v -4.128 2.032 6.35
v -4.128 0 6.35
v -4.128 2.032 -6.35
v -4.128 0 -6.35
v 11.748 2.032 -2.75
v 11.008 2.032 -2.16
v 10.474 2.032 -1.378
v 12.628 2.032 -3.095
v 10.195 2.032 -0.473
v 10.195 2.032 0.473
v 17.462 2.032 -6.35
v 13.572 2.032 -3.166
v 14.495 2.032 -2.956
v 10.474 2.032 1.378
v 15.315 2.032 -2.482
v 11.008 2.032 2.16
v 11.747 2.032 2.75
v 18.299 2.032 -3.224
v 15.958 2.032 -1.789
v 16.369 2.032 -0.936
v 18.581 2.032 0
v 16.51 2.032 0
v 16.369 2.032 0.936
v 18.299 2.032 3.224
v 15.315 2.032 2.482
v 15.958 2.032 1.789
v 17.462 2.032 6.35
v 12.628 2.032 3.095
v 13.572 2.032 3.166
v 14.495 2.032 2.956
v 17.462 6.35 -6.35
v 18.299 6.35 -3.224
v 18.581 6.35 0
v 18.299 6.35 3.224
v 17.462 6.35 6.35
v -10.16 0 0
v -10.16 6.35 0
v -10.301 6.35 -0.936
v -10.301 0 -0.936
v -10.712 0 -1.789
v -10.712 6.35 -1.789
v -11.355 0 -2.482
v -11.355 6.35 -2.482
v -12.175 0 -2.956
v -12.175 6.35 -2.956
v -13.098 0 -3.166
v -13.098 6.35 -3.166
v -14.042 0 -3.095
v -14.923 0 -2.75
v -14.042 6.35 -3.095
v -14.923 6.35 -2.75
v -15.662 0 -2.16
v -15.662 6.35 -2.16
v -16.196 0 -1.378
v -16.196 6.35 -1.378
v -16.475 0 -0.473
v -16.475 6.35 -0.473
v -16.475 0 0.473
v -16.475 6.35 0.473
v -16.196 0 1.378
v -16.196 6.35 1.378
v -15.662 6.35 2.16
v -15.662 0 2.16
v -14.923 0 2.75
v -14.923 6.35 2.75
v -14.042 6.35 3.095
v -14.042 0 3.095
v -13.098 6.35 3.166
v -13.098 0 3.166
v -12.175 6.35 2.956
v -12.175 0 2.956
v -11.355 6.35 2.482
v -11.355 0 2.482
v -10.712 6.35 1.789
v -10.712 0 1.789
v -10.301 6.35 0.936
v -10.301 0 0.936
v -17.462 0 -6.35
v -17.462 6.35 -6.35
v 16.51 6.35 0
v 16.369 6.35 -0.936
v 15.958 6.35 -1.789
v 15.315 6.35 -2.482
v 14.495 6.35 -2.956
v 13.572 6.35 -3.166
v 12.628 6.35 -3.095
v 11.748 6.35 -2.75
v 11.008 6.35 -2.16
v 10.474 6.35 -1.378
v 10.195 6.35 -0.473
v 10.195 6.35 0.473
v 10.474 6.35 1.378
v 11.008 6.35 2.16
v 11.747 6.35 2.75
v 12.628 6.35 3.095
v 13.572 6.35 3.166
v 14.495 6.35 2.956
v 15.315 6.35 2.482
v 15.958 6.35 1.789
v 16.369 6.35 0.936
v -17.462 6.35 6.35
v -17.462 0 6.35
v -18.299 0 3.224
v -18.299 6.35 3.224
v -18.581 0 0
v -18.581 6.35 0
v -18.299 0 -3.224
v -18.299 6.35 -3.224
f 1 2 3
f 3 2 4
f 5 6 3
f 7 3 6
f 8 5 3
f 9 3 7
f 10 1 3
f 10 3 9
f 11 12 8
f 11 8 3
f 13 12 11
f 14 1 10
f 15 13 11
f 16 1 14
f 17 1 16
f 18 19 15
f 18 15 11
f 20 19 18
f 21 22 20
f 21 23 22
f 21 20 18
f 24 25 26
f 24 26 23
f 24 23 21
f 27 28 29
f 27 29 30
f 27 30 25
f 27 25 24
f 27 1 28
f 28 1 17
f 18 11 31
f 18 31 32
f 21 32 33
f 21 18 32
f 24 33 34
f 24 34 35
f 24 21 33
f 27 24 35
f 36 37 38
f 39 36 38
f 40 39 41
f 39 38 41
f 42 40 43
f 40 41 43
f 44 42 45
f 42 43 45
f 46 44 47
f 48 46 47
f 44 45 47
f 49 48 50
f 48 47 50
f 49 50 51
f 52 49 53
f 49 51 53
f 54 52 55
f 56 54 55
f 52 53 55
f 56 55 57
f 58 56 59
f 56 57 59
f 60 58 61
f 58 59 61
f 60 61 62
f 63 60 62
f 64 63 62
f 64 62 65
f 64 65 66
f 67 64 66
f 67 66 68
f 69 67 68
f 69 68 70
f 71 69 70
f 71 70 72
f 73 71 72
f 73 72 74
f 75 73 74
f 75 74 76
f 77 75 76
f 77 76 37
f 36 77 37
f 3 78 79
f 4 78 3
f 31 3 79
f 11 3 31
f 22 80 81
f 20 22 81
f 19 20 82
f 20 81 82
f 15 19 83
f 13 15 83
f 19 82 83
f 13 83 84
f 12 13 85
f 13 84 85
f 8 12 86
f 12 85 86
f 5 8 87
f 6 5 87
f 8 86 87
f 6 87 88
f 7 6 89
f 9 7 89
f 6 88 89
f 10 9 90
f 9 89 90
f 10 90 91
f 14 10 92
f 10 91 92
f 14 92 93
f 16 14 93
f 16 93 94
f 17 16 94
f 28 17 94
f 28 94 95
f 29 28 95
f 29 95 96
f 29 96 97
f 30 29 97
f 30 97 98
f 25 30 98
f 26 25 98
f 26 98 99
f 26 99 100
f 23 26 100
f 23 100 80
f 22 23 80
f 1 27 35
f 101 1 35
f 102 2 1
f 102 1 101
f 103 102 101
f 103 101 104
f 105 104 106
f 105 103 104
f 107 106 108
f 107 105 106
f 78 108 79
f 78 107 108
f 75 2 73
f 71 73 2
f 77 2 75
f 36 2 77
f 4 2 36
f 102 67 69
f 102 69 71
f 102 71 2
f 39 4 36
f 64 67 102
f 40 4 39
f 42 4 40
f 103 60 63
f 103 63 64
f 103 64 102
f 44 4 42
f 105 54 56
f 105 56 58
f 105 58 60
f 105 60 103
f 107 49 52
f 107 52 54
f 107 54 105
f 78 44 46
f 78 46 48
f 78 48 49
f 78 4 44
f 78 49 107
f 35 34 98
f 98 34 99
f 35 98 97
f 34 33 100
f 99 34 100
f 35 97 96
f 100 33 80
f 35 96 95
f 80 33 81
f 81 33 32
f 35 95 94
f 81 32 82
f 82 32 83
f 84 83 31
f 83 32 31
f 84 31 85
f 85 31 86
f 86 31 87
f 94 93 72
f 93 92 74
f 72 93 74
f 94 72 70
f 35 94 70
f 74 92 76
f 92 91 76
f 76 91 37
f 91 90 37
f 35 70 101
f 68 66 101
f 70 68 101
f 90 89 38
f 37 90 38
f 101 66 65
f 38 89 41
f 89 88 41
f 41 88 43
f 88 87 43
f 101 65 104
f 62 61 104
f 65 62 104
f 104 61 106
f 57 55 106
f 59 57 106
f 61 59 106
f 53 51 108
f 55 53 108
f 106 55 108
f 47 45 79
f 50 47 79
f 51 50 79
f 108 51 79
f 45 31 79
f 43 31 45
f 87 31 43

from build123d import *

# Parameters (mm, degrees)
BOSS_EXTRUDE2_DEPTH = 6.35
SKETCH4_R           = 3.175
CUT_EXTRUDE1_DEPTH  = 12.7
CUT_EXTRUDE2_DEPTH  = 2.032


with BuildPart() as part:
    # Sketch3 → Boss-Extrude2 (new body)
    with BuildSketch(Plane(origin=(0, 0, 0), x_dir=(1, 0, 0), z_dir=(0, 1, 0))):
        with BuildLine():
            Line((-17.4625, 6.35), (17.4625, 6.35))
            ThreePointArc((17.4625, 6.35), (18.581211108, 0), (17.4625, -6.35))
            Line((17.4625, -6.35), (-17.4625, -6.35))
            ThreePointArc((-17.4625, -6.35), (-18.581211108, 0), (-17.4625, 6.35))
        make_face()
    extrude(amount=BOSS_EXTRUDE2_DEPTH)

    # Sketch4 → Cut-Extrude1 (cut)
    with BuildSketch(Plane(origin=(0, 6.35, 0), x_dir=(1, 0, 0), z_dir=(0, 1, 0))):
        with Locations((13.335, 0)):
            Circle(SKETCH4_R)
        with Locations((-13.335, 0)):
            Circle(SKETCH4_R)
    extrude(amount=-CUT_EXTRUDE1_DEPTH, mode=Mode.SUBTRACT)

    # Sketch5 → Cut-Extrude2 (cut)
    with BuildSketch(Plane.XZ):
        with BuildLine():
            Line((17.4625, 6.35), (-4.1275, 6.35))
            Line((-4.1275, 6.35), (-4.1275, -6.35))
            Line((-4.1275, -6.35), (17.4625, -6.35))
            ThreePointArc((17.4625, -6.35), (18.581211108, 0), (17.4625, 6.35))
        make_face()
    extrude(amount=-CUT_EXTRUDE2_DEPTH, mode=Mode.SUBTRACT)


solid = part.part
